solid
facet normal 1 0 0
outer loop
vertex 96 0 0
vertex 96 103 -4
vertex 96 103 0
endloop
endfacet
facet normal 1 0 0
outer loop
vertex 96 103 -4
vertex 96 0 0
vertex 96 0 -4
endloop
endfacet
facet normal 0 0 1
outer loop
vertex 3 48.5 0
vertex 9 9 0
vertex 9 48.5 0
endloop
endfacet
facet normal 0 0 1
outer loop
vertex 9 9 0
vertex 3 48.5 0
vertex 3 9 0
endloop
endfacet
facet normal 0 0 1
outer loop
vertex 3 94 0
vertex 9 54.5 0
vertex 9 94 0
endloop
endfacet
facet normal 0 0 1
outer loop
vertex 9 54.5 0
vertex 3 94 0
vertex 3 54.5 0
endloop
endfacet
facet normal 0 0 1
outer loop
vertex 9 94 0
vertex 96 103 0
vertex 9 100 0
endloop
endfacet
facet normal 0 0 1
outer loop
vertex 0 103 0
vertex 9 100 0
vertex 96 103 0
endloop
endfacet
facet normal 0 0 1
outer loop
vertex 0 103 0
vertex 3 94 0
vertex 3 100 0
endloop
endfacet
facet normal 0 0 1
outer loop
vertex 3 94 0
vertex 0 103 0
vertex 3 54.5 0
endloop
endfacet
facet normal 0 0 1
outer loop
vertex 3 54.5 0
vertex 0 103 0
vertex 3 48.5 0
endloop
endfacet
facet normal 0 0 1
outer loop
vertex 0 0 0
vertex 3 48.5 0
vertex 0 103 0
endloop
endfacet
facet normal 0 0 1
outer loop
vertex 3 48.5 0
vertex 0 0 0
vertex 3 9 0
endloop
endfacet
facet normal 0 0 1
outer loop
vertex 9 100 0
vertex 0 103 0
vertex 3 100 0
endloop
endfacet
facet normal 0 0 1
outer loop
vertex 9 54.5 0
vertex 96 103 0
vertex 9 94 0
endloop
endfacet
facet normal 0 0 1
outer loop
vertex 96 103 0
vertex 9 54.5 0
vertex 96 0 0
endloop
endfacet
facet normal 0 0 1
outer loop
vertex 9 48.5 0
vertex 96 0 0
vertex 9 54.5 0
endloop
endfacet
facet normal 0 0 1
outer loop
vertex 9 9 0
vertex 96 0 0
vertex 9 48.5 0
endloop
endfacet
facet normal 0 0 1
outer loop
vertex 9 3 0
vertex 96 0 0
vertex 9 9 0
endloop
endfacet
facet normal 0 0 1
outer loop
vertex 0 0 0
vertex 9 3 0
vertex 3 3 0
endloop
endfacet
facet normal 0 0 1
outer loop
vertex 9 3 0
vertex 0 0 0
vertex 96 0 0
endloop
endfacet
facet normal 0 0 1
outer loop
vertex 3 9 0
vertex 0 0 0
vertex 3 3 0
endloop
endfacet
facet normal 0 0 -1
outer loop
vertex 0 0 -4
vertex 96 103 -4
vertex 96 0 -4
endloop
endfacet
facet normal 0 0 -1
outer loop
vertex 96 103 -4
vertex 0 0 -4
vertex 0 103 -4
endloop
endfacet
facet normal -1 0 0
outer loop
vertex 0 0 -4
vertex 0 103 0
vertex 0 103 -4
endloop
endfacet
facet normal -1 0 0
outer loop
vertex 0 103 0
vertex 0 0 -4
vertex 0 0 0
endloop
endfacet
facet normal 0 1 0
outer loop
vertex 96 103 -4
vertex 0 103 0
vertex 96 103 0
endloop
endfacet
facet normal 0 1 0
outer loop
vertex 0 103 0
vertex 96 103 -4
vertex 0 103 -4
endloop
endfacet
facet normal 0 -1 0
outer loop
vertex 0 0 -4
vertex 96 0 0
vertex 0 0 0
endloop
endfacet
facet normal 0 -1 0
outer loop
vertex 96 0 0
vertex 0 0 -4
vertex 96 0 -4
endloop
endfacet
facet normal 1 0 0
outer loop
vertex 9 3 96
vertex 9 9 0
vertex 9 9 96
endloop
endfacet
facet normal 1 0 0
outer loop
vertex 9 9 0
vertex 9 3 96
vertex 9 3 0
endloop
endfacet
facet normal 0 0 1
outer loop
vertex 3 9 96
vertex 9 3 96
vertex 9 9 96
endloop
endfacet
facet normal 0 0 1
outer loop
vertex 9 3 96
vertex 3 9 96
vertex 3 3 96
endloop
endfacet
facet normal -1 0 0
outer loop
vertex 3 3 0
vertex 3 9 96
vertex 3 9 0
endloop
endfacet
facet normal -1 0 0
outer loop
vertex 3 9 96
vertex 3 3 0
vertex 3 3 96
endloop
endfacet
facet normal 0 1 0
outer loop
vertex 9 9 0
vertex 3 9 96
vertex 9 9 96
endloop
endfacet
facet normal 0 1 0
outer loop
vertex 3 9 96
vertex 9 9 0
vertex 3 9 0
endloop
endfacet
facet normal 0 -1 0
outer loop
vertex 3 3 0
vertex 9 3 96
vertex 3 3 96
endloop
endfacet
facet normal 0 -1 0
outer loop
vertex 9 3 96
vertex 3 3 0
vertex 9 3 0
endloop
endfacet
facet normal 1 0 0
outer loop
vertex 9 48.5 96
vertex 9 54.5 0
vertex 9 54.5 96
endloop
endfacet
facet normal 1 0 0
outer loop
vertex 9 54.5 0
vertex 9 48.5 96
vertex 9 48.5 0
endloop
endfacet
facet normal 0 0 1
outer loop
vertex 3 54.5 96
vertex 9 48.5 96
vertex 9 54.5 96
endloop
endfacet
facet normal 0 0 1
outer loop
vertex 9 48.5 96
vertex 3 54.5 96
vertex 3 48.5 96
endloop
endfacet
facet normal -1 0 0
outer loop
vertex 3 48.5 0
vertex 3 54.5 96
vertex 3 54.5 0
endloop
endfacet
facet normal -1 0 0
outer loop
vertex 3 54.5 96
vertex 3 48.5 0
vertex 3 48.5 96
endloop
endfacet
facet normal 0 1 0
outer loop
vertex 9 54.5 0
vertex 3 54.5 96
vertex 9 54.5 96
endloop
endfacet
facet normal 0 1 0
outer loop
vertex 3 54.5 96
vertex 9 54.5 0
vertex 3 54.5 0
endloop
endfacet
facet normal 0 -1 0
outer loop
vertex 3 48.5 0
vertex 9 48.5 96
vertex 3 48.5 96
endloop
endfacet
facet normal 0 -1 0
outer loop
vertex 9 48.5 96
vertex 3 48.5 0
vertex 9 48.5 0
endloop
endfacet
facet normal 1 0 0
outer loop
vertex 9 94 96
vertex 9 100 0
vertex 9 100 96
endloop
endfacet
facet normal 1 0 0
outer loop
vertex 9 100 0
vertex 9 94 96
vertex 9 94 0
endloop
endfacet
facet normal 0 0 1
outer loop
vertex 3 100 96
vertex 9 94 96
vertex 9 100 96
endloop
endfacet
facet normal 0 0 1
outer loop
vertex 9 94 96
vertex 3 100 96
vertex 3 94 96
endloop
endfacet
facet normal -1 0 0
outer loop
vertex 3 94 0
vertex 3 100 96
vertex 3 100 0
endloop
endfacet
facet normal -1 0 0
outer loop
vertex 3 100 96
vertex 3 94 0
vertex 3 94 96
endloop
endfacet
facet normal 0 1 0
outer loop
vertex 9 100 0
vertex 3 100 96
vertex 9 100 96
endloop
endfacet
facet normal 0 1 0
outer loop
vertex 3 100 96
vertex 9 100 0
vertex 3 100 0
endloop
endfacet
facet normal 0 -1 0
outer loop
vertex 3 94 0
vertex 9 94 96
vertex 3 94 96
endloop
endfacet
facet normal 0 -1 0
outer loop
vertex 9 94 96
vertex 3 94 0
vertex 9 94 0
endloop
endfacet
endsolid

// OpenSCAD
// everything is in inches

//create a block
module block(height, width, depth) 
{
	scale([height,width,depth]) //scale
	{
			//make a cube
			cube([1,1,1], center = true); 
	}
}

slab_w = 96;
slab_h = 103;
slab_d = 4;
post_h = 96;
post_w = 6;

//create 3 stacked dodecahedra 
//call the module with a height of 1 and move up 2
color("grey")translate([slab_w/2,slab_h/2,-slab_d/2])block(slab_w, slab_h, slab_d); 
color("yellow")translate([post_w,post_w,post_h/2])block(post_w, post_w, post_h); 
color("yellow")translate([post_w,slab_h/2,post_h/2])block(post_w, post_w, post_h); 
color("yellow")translate([post_w,slab_h - post_w,post_h/2])block(post_w, post_w, post_h); 

//call the module with a height of 2
